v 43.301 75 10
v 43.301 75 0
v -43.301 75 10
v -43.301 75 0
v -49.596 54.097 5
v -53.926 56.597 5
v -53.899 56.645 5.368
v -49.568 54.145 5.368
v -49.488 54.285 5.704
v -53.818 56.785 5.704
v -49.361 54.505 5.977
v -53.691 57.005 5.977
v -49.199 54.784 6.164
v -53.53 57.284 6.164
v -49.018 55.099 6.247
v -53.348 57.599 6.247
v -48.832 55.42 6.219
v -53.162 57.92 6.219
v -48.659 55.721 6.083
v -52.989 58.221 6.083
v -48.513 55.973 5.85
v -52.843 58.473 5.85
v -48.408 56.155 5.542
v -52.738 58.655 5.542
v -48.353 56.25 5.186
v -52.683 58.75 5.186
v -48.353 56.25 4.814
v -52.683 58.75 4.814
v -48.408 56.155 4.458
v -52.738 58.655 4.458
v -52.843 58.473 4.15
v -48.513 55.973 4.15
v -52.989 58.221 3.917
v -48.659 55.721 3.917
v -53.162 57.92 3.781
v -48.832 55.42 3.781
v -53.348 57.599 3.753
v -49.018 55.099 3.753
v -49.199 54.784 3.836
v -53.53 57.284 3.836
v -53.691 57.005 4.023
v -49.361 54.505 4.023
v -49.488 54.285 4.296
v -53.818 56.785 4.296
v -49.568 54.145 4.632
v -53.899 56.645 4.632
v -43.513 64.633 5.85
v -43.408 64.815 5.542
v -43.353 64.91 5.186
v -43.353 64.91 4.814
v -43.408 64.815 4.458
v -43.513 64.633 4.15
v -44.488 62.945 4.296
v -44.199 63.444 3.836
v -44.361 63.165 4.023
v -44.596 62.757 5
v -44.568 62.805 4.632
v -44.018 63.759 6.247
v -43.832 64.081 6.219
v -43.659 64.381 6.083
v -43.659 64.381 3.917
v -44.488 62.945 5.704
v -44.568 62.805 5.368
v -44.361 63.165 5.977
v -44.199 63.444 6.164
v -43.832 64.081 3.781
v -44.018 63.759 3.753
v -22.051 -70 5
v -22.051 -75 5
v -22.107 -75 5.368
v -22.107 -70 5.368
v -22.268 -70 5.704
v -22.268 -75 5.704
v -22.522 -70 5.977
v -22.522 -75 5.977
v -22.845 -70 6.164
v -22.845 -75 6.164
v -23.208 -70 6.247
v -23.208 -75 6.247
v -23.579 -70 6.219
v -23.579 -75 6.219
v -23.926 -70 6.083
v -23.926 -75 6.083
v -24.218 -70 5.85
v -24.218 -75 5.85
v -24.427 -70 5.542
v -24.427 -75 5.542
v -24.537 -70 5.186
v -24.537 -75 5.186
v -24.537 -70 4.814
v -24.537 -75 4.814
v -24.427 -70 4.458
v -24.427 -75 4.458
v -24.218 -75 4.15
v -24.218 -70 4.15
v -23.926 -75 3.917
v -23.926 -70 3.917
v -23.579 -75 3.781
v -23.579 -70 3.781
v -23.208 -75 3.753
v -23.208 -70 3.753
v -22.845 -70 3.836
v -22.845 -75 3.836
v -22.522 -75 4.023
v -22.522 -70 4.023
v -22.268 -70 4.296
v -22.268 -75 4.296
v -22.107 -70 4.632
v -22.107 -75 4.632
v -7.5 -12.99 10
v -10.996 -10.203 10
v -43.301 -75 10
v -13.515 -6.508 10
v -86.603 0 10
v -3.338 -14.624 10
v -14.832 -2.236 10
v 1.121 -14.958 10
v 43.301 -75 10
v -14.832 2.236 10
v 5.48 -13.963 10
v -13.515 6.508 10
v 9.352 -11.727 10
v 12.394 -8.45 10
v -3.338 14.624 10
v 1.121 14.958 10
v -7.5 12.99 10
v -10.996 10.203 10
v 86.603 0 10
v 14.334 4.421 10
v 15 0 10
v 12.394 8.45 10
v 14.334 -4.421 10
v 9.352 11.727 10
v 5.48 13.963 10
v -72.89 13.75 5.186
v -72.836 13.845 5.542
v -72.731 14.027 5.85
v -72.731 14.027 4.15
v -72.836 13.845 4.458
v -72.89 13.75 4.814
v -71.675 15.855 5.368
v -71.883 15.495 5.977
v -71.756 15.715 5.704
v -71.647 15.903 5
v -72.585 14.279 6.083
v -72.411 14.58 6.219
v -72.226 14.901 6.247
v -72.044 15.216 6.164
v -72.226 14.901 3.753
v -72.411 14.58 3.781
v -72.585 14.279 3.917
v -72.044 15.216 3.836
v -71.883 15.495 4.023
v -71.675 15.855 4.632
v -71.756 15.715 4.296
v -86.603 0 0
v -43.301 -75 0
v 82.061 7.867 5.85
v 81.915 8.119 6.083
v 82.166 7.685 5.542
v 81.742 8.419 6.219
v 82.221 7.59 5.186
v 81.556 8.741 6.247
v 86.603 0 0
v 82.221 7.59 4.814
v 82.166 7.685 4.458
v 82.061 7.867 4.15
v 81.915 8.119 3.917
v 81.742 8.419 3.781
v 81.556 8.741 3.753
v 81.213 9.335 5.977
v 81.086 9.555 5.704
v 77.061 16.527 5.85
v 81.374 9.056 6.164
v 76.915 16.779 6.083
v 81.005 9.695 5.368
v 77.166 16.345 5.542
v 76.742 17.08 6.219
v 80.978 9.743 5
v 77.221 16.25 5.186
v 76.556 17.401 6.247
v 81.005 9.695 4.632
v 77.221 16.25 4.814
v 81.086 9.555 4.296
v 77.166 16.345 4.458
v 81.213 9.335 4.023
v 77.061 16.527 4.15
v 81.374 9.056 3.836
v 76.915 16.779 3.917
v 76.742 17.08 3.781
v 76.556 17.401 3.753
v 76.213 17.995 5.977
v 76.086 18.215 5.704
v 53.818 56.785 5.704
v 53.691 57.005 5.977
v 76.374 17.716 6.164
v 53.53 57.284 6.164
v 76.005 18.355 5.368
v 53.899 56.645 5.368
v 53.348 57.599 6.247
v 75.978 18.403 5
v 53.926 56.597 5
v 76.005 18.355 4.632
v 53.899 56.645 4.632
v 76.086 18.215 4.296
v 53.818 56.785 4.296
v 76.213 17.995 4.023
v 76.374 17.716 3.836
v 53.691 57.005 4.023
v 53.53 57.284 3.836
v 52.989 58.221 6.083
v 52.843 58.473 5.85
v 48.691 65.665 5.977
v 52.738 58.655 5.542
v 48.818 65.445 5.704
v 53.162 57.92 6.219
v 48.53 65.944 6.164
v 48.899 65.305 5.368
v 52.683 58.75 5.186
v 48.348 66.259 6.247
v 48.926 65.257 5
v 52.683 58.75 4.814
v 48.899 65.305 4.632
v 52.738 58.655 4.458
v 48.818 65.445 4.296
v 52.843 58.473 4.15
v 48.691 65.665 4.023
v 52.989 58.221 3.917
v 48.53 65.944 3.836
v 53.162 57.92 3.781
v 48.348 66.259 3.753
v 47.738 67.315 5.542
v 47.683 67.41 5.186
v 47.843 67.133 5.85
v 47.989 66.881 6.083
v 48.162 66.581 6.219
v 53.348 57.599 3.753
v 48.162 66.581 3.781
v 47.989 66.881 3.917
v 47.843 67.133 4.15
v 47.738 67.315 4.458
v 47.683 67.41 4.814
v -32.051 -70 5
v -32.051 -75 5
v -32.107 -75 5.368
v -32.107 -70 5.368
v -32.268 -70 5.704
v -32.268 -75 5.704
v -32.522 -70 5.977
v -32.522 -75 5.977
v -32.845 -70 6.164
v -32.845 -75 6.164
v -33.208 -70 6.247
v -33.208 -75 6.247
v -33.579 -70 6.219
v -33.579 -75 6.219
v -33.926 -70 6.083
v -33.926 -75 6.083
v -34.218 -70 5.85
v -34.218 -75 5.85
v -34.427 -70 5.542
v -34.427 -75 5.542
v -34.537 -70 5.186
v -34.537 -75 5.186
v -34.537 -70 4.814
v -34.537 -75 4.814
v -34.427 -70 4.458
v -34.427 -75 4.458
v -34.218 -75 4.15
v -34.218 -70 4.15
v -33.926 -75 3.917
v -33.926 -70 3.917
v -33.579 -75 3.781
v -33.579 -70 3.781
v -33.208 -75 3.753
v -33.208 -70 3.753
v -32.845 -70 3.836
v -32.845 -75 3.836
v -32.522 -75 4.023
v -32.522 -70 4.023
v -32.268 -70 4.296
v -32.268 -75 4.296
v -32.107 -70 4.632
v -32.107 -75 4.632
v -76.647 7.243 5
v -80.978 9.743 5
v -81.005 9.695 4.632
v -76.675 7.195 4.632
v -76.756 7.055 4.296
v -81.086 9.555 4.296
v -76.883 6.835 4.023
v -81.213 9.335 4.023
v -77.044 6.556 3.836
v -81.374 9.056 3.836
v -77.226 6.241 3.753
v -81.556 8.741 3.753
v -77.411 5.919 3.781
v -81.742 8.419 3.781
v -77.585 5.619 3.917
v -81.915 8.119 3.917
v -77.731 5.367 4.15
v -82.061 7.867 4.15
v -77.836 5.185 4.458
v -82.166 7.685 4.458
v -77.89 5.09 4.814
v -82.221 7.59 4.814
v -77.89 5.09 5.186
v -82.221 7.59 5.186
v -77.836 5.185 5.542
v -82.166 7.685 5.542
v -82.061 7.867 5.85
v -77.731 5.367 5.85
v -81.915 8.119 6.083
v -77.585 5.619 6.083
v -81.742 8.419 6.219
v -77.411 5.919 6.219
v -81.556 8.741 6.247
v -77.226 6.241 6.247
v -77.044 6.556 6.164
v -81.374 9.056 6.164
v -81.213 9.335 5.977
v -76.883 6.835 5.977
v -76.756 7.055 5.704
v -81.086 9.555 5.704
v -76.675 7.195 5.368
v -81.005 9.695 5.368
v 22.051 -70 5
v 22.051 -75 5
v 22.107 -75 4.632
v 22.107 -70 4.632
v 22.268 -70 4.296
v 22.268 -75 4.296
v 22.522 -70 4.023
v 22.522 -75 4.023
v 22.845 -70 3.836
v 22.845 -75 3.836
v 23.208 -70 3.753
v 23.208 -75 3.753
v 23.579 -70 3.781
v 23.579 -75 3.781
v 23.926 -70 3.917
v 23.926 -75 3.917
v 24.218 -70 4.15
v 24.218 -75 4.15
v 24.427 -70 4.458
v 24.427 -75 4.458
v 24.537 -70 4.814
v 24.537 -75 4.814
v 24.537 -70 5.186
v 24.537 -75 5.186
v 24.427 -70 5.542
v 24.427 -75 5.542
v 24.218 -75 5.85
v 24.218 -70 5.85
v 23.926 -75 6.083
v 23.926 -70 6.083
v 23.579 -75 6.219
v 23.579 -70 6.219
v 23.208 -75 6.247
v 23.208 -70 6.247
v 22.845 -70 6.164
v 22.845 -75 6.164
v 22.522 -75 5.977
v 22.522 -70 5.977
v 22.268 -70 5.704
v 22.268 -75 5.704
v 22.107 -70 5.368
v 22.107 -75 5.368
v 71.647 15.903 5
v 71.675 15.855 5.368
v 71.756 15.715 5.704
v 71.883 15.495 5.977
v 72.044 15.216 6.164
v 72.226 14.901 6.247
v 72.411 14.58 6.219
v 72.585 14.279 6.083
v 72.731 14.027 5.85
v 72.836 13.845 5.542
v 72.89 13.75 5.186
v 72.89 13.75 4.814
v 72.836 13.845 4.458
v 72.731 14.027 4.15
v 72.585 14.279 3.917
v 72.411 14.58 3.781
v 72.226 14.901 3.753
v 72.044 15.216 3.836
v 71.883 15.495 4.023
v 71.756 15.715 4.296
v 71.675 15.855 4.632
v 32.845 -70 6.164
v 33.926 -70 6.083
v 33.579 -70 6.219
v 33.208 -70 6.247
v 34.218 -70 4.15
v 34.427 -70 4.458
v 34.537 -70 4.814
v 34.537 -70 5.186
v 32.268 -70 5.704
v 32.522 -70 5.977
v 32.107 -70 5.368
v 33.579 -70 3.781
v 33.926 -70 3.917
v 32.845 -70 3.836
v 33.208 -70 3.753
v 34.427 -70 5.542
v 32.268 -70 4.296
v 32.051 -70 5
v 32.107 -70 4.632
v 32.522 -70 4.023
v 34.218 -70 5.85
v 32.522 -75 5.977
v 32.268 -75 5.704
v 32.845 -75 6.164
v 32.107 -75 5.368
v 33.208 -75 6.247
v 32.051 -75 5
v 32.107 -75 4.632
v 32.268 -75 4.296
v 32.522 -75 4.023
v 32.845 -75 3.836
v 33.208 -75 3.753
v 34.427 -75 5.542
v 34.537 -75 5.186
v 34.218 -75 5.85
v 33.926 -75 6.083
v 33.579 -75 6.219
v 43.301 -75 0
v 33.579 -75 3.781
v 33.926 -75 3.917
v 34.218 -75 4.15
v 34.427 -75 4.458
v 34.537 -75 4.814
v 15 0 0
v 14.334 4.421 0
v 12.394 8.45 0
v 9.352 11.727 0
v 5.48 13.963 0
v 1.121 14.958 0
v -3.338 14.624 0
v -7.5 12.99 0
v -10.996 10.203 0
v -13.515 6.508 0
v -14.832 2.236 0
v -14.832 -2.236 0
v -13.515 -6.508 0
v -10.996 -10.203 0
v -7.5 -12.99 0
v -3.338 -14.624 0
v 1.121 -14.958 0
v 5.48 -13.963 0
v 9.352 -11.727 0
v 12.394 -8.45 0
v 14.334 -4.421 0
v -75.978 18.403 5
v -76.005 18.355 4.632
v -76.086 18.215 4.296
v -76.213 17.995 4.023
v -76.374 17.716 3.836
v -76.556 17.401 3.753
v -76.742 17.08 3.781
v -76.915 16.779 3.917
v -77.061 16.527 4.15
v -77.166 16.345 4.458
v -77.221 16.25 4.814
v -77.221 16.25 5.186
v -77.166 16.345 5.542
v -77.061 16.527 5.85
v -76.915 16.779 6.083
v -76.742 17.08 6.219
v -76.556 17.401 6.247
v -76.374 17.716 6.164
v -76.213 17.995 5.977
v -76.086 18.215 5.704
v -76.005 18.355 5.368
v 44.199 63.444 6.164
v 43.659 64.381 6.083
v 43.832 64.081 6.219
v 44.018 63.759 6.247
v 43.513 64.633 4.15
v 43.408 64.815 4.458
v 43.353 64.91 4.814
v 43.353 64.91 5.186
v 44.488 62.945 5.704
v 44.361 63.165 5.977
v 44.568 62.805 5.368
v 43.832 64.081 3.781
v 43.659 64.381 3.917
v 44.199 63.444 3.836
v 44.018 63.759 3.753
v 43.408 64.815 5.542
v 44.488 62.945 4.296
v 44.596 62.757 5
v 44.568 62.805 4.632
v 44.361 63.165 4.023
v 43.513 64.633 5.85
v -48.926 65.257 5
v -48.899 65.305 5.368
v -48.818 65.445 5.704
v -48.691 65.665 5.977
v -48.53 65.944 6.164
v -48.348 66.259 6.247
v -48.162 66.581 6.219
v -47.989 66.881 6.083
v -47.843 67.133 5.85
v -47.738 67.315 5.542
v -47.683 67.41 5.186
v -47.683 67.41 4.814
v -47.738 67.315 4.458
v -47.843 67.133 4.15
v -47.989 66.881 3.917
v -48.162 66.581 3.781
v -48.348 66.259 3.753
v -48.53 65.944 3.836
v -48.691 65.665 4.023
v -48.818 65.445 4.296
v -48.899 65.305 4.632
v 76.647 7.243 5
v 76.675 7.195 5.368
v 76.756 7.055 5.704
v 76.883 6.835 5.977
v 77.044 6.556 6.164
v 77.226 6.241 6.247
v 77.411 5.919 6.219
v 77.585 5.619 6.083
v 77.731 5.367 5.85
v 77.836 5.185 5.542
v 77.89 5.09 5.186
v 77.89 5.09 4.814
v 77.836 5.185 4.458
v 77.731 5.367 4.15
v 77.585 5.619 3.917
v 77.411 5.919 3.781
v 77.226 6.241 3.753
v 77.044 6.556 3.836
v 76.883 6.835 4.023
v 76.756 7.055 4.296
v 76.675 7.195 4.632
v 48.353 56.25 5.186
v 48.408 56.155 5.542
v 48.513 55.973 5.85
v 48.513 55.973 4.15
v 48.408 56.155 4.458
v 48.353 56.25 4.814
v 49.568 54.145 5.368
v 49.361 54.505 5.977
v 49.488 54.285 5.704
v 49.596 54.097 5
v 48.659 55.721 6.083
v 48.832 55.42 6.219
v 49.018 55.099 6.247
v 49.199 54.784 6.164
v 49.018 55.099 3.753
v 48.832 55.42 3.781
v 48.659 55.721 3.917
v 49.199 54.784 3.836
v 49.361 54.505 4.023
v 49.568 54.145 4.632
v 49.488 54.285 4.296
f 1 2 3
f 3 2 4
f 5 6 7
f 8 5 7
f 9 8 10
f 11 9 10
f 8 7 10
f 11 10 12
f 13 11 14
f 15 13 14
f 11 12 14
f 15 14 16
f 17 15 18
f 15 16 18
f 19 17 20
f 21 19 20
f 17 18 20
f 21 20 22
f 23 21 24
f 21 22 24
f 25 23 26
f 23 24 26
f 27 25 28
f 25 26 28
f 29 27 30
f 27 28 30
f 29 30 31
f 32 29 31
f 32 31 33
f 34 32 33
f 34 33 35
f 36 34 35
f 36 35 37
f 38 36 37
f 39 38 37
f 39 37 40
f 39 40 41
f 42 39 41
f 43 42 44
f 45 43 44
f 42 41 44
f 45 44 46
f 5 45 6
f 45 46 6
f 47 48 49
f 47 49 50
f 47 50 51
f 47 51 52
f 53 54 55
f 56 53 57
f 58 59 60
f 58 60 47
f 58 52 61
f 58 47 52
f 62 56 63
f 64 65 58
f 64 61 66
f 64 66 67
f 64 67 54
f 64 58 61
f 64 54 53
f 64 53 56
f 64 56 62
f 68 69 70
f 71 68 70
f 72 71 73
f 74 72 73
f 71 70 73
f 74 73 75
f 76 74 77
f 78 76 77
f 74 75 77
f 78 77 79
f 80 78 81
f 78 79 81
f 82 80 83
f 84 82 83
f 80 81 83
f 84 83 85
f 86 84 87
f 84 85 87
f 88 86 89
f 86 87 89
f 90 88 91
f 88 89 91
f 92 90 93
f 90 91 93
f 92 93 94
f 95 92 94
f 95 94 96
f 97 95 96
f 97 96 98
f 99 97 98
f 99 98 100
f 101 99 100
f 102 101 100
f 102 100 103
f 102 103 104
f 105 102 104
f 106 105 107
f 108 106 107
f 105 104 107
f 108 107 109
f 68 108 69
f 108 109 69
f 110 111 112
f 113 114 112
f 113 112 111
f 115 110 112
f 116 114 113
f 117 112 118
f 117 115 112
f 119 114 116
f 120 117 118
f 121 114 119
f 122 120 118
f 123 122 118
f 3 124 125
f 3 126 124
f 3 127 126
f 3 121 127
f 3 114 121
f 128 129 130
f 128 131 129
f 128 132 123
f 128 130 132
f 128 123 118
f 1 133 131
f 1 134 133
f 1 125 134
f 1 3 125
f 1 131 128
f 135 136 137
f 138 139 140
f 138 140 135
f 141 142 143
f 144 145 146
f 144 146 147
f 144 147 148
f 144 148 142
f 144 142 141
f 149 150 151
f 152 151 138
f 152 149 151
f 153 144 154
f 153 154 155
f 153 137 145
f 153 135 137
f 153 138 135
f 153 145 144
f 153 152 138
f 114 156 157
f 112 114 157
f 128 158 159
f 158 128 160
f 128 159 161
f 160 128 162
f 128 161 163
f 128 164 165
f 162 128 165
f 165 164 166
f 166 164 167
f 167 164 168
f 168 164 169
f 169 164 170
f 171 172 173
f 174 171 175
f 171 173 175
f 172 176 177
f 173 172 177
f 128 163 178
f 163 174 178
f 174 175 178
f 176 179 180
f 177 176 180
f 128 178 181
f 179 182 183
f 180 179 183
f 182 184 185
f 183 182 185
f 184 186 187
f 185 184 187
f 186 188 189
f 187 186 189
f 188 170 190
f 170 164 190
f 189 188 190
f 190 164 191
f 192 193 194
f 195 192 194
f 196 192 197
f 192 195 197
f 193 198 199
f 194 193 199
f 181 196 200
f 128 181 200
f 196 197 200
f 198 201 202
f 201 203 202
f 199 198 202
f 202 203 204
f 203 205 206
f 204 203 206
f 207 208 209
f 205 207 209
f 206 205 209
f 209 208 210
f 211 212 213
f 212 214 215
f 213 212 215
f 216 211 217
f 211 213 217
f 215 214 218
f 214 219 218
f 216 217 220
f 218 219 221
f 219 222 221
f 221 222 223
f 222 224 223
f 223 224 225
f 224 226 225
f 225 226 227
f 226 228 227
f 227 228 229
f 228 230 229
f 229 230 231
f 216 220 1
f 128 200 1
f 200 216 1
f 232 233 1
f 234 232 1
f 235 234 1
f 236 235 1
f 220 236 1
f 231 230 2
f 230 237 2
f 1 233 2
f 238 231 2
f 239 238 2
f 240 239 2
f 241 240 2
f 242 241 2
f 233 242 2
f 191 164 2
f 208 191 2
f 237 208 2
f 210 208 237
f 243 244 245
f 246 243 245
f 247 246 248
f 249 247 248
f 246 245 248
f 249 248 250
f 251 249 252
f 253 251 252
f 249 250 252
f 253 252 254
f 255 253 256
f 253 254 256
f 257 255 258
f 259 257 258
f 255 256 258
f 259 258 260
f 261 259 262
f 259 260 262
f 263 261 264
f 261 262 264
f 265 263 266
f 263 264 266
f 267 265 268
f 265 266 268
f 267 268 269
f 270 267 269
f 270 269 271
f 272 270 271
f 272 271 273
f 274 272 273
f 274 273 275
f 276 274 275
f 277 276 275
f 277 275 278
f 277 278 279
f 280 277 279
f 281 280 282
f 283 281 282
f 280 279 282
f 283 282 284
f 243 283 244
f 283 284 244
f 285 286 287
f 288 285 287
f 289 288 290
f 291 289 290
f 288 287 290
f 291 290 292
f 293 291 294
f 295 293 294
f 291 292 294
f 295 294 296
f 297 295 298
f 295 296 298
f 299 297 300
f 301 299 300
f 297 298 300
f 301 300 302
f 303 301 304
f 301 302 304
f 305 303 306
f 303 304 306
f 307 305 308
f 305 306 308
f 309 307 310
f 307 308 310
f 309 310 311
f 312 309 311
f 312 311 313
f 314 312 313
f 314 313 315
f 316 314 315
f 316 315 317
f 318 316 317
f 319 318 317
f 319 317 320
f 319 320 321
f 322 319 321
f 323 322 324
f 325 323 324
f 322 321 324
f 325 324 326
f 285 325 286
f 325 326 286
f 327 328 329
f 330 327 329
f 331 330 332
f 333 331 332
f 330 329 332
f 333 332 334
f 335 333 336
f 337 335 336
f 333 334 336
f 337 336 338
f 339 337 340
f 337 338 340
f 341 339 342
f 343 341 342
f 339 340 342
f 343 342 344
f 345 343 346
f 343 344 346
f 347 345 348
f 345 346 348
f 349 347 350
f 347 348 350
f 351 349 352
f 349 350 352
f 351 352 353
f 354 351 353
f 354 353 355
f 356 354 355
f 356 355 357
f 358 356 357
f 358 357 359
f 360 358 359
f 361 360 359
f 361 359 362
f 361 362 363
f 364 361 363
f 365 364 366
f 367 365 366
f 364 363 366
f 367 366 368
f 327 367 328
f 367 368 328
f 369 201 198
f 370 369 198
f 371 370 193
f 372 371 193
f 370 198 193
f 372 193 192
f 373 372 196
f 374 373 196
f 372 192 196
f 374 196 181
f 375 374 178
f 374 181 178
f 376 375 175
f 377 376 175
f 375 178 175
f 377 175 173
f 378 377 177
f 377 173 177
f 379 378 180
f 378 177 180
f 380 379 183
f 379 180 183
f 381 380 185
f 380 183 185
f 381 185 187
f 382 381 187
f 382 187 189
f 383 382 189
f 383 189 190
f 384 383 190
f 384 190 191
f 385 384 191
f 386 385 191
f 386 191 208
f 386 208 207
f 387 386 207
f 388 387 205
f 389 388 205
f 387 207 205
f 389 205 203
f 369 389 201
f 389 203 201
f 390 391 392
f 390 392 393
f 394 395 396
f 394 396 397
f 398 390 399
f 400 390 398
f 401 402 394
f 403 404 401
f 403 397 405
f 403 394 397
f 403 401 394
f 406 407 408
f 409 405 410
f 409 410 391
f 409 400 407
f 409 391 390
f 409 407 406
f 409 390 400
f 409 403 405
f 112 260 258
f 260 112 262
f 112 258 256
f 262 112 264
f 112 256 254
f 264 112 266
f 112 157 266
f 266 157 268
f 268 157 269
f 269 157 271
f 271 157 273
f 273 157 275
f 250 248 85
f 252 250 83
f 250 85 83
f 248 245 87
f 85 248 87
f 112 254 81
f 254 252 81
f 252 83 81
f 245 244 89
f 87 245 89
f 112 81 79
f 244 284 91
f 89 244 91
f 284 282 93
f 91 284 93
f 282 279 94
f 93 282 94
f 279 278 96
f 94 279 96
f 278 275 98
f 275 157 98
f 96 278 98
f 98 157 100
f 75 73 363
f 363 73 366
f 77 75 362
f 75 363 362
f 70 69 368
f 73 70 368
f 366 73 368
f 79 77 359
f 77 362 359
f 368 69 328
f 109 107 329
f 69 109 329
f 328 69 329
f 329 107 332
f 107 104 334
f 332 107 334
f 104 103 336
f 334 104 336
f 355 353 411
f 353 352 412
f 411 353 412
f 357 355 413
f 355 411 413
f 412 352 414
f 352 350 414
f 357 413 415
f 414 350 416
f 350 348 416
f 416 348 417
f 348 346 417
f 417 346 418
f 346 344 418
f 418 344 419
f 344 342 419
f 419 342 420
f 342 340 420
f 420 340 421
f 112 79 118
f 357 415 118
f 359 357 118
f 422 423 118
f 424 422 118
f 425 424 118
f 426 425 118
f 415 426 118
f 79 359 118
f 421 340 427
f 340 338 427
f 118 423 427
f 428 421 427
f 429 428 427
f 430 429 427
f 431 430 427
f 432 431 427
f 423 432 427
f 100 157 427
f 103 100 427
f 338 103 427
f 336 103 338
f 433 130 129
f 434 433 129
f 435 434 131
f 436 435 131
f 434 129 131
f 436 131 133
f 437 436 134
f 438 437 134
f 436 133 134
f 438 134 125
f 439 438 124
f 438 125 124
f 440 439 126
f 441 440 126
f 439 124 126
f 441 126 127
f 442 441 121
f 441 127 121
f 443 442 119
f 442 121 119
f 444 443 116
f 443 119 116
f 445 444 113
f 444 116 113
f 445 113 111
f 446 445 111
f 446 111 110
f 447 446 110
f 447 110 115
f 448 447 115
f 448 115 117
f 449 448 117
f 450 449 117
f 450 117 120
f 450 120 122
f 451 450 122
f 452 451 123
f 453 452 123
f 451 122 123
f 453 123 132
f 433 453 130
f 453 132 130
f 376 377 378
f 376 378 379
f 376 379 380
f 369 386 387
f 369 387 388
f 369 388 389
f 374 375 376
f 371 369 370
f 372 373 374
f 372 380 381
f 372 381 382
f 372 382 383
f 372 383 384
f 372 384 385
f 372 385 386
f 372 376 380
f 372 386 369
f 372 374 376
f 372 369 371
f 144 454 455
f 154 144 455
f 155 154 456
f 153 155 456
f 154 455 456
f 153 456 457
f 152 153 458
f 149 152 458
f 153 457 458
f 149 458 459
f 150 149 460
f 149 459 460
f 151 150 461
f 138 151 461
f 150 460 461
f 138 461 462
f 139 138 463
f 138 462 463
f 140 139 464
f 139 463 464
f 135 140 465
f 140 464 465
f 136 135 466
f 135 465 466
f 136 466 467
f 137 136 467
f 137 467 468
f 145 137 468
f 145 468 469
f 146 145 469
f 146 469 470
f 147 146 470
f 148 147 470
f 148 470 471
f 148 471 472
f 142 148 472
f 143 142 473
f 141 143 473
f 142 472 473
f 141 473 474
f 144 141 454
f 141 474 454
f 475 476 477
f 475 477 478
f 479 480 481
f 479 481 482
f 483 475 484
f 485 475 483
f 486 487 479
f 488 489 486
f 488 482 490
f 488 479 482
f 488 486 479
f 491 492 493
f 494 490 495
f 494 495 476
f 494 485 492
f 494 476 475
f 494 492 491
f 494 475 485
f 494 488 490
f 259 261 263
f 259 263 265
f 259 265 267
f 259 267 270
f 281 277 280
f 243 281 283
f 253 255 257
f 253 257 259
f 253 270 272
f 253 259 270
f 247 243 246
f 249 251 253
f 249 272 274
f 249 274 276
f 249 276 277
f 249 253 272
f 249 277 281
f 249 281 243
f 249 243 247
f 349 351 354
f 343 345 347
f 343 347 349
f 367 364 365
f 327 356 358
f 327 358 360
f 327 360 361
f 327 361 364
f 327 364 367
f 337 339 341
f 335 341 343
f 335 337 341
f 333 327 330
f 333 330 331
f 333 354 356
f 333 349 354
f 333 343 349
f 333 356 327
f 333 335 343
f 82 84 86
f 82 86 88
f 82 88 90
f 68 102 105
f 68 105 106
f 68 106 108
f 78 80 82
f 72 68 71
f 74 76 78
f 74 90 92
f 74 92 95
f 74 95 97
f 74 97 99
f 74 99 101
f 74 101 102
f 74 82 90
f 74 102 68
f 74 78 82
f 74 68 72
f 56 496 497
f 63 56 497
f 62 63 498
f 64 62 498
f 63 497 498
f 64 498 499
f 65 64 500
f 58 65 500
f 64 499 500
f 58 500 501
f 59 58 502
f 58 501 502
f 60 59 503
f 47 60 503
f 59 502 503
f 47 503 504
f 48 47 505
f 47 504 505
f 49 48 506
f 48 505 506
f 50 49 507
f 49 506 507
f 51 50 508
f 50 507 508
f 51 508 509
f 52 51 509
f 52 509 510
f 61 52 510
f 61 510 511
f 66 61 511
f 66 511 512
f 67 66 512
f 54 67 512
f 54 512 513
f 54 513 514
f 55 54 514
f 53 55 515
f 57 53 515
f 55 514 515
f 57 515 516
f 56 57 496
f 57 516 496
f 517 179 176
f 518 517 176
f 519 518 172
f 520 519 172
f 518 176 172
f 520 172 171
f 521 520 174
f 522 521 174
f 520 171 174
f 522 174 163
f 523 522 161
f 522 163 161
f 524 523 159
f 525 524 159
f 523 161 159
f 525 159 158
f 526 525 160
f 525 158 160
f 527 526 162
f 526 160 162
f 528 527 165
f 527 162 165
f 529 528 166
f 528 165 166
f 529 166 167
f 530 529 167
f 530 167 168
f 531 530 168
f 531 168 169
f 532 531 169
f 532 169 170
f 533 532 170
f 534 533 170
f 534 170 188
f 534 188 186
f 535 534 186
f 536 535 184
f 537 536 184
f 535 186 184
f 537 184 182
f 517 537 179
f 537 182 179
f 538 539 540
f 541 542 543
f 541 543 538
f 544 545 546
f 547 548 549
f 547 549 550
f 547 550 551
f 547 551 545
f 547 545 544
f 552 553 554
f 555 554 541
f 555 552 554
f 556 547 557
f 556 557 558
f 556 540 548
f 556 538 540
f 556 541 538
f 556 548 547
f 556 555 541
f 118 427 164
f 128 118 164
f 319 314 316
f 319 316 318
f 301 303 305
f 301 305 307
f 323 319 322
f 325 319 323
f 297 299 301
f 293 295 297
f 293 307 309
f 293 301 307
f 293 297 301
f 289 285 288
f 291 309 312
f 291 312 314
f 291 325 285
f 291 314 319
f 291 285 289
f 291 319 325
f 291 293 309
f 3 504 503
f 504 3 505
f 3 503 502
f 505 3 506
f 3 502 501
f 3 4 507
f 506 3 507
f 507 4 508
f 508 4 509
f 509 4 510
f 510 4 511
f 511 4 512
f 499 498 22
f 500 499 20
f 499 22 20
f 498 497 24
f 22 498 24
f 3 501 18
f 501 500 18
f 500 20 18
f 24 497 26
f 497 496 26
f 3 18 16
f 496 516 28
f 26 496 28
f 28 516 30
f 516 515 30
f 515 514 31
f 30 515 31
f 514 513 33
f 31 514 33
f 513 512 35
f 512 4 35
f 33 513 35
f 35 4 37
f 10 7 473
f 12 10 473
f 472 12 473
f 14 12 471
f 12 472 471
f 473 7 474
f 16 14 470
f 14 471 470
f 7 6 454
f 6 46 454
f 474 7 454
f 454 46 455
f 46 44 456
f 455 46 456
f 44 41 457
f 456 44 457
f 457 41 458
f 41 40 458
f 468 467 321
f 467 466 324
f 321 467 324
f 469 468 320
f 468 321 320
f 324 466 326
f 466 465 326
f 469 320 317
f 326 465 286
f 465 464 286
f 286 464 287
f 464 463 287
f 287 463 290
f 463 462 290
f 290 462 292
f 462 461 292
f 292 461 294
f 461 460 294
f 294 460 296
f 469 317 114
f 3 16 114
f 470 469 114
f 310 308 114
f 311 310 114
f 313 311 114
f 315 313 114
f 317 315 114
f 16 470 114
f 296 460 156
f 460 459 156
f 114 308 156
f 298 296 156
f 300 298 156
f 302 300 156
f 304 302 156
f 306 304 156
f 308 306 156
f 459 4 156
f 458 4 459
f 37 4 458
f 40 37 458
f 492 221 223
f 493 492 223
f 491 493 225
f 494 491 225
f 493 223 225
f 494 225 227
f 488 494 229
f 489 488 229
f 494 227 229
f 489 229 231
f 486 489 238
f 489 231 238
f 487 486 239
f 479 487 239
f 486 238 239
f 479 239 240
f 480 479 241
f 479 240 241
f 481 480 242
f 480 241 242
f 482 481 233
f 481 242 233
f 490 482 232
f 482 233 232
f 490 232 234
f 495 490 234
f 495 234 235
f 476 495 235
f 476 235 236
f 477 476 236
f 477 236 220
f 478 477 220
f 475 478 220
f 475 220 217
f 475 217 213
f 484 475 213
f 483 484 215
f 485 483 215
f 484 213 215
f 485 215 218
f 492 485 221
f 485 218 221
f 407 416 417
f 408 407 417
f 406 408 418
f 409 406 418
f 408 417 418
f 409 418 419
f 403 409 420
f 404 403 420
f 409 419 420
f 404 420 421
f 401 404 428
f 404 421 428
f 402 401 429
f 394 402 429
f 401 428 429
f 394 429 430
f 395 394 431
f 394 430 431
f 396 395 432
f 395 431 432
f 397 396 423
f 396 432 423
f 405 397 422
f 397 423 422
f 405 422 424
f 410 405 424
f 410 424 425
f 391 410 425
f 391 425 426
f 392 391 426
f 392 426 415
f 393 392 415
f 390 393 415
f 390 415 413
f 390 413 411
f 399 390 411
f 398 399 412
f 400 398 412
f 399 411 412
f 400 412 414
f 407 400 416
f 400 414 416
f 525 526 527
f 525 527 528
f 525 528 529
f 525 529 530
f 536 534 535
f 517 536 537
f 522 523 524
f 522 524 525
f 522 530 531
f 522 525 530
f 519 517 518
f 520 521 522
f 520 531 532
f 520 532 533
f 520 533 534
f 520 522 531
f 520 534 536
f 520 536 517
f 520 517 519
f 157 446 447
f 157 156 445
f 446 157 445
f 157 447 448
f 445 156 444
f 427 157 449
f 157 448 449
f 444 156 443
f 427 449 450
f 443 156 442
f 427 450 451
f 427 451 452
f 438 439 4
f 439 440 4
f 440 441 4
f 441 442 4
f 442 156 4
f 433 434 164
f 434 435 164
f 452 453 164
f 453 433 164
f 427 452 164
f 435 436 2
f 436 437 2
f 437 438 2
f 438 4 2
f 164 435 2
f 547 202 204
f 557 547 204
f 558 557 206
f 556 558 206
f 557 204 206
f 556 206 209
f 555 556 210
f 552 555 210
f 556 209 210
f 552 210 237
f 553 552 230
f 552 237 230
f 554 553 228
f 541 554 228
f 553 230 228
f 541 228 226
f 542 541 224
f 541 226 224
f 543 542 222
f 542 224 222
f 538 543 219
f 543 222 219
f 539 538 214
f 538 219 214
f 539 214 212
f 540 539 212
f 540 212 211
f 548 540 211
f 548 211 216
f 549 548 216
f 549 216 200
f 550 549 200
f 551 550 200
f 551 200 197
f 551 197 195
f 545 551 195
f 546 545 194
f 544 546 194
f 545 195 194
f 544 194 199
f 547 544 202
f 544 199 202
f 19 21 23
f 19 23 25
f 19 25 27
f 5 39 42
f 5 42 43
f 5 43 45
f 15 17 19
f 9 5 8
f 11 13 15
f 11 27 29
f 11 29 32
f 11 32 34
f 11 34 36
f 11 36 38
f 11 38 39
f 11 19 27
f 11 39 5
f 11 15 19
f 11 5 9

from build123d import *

# Parameters (mm, degrees)
BOSS_EXTRUDE1_DEPTH = 10
SKETCH2_R           = 1.25
CUT_EXTRUDE1_DEPTH  = 5
CIRPATTERN1_COUNT   = 3
SKETCH3_R           = 15
CUT_EXTRUDE2_DEPTH  = 10


with BuildPart() as part:
    # Sketch1 → Boss-Extrude1 (new body)
    with BuildSketch(Plane.XY):
        Polygon((43.301270189, -75), (86.602540378, 0), (43.301270189, 75), (-43.301270189, 75), (-86.602540378, 0), (-43.301270189, -75), align=None)
    extrude(amount=BOSS_EXTRUDE1_DEPTH)

    # Sketch2 → Cut-Extrude1 (cut)
    with BuildSketch(Plane.XZ.offset(75)):
        with Locations((-33.301270189, 5)):
            Circle(SKETCH2_R)
        with Locations((-23.301270189, 5)):
            Circle(SKETCH2_R)
        with Locations(Location((33.301270189, 5, 0), (0, 0, 180))):
            Circle(SKETCH2_R)
        with Locations(Location((23.301270189, 5, 0), (0, 0, 180))):
            Circle(SKETCH2_R)
    cut_extrude1 = extrude(amount=-CUT_EXTRUDE1_DEPTH, mode=Mode.SUBTRACT)

    # CirPattern1: Cut-Extrude1 ×3 about axis
    cirpattern1_axis = Axis((0, 0, 0), (0, 0, 1))
    for i in range(1, CIRPATTERN1_COUNT):
        add(cut_extrude1.rotate(cirpattern1_axis, i * 360 / CIRPATTERN1_COUNT), mode=Mode.SUBTRACT)

    # Sketch3 → Cut-Extrude2 (cut)
    with BuildSketch(Plane.XY.offset(10)):
        Circle(SKETCH3_R)
    extrude(amount=-CUT_EXTRUDE2_DEPTH, mode=Mode.SUBTRACT)


solid = part.part
